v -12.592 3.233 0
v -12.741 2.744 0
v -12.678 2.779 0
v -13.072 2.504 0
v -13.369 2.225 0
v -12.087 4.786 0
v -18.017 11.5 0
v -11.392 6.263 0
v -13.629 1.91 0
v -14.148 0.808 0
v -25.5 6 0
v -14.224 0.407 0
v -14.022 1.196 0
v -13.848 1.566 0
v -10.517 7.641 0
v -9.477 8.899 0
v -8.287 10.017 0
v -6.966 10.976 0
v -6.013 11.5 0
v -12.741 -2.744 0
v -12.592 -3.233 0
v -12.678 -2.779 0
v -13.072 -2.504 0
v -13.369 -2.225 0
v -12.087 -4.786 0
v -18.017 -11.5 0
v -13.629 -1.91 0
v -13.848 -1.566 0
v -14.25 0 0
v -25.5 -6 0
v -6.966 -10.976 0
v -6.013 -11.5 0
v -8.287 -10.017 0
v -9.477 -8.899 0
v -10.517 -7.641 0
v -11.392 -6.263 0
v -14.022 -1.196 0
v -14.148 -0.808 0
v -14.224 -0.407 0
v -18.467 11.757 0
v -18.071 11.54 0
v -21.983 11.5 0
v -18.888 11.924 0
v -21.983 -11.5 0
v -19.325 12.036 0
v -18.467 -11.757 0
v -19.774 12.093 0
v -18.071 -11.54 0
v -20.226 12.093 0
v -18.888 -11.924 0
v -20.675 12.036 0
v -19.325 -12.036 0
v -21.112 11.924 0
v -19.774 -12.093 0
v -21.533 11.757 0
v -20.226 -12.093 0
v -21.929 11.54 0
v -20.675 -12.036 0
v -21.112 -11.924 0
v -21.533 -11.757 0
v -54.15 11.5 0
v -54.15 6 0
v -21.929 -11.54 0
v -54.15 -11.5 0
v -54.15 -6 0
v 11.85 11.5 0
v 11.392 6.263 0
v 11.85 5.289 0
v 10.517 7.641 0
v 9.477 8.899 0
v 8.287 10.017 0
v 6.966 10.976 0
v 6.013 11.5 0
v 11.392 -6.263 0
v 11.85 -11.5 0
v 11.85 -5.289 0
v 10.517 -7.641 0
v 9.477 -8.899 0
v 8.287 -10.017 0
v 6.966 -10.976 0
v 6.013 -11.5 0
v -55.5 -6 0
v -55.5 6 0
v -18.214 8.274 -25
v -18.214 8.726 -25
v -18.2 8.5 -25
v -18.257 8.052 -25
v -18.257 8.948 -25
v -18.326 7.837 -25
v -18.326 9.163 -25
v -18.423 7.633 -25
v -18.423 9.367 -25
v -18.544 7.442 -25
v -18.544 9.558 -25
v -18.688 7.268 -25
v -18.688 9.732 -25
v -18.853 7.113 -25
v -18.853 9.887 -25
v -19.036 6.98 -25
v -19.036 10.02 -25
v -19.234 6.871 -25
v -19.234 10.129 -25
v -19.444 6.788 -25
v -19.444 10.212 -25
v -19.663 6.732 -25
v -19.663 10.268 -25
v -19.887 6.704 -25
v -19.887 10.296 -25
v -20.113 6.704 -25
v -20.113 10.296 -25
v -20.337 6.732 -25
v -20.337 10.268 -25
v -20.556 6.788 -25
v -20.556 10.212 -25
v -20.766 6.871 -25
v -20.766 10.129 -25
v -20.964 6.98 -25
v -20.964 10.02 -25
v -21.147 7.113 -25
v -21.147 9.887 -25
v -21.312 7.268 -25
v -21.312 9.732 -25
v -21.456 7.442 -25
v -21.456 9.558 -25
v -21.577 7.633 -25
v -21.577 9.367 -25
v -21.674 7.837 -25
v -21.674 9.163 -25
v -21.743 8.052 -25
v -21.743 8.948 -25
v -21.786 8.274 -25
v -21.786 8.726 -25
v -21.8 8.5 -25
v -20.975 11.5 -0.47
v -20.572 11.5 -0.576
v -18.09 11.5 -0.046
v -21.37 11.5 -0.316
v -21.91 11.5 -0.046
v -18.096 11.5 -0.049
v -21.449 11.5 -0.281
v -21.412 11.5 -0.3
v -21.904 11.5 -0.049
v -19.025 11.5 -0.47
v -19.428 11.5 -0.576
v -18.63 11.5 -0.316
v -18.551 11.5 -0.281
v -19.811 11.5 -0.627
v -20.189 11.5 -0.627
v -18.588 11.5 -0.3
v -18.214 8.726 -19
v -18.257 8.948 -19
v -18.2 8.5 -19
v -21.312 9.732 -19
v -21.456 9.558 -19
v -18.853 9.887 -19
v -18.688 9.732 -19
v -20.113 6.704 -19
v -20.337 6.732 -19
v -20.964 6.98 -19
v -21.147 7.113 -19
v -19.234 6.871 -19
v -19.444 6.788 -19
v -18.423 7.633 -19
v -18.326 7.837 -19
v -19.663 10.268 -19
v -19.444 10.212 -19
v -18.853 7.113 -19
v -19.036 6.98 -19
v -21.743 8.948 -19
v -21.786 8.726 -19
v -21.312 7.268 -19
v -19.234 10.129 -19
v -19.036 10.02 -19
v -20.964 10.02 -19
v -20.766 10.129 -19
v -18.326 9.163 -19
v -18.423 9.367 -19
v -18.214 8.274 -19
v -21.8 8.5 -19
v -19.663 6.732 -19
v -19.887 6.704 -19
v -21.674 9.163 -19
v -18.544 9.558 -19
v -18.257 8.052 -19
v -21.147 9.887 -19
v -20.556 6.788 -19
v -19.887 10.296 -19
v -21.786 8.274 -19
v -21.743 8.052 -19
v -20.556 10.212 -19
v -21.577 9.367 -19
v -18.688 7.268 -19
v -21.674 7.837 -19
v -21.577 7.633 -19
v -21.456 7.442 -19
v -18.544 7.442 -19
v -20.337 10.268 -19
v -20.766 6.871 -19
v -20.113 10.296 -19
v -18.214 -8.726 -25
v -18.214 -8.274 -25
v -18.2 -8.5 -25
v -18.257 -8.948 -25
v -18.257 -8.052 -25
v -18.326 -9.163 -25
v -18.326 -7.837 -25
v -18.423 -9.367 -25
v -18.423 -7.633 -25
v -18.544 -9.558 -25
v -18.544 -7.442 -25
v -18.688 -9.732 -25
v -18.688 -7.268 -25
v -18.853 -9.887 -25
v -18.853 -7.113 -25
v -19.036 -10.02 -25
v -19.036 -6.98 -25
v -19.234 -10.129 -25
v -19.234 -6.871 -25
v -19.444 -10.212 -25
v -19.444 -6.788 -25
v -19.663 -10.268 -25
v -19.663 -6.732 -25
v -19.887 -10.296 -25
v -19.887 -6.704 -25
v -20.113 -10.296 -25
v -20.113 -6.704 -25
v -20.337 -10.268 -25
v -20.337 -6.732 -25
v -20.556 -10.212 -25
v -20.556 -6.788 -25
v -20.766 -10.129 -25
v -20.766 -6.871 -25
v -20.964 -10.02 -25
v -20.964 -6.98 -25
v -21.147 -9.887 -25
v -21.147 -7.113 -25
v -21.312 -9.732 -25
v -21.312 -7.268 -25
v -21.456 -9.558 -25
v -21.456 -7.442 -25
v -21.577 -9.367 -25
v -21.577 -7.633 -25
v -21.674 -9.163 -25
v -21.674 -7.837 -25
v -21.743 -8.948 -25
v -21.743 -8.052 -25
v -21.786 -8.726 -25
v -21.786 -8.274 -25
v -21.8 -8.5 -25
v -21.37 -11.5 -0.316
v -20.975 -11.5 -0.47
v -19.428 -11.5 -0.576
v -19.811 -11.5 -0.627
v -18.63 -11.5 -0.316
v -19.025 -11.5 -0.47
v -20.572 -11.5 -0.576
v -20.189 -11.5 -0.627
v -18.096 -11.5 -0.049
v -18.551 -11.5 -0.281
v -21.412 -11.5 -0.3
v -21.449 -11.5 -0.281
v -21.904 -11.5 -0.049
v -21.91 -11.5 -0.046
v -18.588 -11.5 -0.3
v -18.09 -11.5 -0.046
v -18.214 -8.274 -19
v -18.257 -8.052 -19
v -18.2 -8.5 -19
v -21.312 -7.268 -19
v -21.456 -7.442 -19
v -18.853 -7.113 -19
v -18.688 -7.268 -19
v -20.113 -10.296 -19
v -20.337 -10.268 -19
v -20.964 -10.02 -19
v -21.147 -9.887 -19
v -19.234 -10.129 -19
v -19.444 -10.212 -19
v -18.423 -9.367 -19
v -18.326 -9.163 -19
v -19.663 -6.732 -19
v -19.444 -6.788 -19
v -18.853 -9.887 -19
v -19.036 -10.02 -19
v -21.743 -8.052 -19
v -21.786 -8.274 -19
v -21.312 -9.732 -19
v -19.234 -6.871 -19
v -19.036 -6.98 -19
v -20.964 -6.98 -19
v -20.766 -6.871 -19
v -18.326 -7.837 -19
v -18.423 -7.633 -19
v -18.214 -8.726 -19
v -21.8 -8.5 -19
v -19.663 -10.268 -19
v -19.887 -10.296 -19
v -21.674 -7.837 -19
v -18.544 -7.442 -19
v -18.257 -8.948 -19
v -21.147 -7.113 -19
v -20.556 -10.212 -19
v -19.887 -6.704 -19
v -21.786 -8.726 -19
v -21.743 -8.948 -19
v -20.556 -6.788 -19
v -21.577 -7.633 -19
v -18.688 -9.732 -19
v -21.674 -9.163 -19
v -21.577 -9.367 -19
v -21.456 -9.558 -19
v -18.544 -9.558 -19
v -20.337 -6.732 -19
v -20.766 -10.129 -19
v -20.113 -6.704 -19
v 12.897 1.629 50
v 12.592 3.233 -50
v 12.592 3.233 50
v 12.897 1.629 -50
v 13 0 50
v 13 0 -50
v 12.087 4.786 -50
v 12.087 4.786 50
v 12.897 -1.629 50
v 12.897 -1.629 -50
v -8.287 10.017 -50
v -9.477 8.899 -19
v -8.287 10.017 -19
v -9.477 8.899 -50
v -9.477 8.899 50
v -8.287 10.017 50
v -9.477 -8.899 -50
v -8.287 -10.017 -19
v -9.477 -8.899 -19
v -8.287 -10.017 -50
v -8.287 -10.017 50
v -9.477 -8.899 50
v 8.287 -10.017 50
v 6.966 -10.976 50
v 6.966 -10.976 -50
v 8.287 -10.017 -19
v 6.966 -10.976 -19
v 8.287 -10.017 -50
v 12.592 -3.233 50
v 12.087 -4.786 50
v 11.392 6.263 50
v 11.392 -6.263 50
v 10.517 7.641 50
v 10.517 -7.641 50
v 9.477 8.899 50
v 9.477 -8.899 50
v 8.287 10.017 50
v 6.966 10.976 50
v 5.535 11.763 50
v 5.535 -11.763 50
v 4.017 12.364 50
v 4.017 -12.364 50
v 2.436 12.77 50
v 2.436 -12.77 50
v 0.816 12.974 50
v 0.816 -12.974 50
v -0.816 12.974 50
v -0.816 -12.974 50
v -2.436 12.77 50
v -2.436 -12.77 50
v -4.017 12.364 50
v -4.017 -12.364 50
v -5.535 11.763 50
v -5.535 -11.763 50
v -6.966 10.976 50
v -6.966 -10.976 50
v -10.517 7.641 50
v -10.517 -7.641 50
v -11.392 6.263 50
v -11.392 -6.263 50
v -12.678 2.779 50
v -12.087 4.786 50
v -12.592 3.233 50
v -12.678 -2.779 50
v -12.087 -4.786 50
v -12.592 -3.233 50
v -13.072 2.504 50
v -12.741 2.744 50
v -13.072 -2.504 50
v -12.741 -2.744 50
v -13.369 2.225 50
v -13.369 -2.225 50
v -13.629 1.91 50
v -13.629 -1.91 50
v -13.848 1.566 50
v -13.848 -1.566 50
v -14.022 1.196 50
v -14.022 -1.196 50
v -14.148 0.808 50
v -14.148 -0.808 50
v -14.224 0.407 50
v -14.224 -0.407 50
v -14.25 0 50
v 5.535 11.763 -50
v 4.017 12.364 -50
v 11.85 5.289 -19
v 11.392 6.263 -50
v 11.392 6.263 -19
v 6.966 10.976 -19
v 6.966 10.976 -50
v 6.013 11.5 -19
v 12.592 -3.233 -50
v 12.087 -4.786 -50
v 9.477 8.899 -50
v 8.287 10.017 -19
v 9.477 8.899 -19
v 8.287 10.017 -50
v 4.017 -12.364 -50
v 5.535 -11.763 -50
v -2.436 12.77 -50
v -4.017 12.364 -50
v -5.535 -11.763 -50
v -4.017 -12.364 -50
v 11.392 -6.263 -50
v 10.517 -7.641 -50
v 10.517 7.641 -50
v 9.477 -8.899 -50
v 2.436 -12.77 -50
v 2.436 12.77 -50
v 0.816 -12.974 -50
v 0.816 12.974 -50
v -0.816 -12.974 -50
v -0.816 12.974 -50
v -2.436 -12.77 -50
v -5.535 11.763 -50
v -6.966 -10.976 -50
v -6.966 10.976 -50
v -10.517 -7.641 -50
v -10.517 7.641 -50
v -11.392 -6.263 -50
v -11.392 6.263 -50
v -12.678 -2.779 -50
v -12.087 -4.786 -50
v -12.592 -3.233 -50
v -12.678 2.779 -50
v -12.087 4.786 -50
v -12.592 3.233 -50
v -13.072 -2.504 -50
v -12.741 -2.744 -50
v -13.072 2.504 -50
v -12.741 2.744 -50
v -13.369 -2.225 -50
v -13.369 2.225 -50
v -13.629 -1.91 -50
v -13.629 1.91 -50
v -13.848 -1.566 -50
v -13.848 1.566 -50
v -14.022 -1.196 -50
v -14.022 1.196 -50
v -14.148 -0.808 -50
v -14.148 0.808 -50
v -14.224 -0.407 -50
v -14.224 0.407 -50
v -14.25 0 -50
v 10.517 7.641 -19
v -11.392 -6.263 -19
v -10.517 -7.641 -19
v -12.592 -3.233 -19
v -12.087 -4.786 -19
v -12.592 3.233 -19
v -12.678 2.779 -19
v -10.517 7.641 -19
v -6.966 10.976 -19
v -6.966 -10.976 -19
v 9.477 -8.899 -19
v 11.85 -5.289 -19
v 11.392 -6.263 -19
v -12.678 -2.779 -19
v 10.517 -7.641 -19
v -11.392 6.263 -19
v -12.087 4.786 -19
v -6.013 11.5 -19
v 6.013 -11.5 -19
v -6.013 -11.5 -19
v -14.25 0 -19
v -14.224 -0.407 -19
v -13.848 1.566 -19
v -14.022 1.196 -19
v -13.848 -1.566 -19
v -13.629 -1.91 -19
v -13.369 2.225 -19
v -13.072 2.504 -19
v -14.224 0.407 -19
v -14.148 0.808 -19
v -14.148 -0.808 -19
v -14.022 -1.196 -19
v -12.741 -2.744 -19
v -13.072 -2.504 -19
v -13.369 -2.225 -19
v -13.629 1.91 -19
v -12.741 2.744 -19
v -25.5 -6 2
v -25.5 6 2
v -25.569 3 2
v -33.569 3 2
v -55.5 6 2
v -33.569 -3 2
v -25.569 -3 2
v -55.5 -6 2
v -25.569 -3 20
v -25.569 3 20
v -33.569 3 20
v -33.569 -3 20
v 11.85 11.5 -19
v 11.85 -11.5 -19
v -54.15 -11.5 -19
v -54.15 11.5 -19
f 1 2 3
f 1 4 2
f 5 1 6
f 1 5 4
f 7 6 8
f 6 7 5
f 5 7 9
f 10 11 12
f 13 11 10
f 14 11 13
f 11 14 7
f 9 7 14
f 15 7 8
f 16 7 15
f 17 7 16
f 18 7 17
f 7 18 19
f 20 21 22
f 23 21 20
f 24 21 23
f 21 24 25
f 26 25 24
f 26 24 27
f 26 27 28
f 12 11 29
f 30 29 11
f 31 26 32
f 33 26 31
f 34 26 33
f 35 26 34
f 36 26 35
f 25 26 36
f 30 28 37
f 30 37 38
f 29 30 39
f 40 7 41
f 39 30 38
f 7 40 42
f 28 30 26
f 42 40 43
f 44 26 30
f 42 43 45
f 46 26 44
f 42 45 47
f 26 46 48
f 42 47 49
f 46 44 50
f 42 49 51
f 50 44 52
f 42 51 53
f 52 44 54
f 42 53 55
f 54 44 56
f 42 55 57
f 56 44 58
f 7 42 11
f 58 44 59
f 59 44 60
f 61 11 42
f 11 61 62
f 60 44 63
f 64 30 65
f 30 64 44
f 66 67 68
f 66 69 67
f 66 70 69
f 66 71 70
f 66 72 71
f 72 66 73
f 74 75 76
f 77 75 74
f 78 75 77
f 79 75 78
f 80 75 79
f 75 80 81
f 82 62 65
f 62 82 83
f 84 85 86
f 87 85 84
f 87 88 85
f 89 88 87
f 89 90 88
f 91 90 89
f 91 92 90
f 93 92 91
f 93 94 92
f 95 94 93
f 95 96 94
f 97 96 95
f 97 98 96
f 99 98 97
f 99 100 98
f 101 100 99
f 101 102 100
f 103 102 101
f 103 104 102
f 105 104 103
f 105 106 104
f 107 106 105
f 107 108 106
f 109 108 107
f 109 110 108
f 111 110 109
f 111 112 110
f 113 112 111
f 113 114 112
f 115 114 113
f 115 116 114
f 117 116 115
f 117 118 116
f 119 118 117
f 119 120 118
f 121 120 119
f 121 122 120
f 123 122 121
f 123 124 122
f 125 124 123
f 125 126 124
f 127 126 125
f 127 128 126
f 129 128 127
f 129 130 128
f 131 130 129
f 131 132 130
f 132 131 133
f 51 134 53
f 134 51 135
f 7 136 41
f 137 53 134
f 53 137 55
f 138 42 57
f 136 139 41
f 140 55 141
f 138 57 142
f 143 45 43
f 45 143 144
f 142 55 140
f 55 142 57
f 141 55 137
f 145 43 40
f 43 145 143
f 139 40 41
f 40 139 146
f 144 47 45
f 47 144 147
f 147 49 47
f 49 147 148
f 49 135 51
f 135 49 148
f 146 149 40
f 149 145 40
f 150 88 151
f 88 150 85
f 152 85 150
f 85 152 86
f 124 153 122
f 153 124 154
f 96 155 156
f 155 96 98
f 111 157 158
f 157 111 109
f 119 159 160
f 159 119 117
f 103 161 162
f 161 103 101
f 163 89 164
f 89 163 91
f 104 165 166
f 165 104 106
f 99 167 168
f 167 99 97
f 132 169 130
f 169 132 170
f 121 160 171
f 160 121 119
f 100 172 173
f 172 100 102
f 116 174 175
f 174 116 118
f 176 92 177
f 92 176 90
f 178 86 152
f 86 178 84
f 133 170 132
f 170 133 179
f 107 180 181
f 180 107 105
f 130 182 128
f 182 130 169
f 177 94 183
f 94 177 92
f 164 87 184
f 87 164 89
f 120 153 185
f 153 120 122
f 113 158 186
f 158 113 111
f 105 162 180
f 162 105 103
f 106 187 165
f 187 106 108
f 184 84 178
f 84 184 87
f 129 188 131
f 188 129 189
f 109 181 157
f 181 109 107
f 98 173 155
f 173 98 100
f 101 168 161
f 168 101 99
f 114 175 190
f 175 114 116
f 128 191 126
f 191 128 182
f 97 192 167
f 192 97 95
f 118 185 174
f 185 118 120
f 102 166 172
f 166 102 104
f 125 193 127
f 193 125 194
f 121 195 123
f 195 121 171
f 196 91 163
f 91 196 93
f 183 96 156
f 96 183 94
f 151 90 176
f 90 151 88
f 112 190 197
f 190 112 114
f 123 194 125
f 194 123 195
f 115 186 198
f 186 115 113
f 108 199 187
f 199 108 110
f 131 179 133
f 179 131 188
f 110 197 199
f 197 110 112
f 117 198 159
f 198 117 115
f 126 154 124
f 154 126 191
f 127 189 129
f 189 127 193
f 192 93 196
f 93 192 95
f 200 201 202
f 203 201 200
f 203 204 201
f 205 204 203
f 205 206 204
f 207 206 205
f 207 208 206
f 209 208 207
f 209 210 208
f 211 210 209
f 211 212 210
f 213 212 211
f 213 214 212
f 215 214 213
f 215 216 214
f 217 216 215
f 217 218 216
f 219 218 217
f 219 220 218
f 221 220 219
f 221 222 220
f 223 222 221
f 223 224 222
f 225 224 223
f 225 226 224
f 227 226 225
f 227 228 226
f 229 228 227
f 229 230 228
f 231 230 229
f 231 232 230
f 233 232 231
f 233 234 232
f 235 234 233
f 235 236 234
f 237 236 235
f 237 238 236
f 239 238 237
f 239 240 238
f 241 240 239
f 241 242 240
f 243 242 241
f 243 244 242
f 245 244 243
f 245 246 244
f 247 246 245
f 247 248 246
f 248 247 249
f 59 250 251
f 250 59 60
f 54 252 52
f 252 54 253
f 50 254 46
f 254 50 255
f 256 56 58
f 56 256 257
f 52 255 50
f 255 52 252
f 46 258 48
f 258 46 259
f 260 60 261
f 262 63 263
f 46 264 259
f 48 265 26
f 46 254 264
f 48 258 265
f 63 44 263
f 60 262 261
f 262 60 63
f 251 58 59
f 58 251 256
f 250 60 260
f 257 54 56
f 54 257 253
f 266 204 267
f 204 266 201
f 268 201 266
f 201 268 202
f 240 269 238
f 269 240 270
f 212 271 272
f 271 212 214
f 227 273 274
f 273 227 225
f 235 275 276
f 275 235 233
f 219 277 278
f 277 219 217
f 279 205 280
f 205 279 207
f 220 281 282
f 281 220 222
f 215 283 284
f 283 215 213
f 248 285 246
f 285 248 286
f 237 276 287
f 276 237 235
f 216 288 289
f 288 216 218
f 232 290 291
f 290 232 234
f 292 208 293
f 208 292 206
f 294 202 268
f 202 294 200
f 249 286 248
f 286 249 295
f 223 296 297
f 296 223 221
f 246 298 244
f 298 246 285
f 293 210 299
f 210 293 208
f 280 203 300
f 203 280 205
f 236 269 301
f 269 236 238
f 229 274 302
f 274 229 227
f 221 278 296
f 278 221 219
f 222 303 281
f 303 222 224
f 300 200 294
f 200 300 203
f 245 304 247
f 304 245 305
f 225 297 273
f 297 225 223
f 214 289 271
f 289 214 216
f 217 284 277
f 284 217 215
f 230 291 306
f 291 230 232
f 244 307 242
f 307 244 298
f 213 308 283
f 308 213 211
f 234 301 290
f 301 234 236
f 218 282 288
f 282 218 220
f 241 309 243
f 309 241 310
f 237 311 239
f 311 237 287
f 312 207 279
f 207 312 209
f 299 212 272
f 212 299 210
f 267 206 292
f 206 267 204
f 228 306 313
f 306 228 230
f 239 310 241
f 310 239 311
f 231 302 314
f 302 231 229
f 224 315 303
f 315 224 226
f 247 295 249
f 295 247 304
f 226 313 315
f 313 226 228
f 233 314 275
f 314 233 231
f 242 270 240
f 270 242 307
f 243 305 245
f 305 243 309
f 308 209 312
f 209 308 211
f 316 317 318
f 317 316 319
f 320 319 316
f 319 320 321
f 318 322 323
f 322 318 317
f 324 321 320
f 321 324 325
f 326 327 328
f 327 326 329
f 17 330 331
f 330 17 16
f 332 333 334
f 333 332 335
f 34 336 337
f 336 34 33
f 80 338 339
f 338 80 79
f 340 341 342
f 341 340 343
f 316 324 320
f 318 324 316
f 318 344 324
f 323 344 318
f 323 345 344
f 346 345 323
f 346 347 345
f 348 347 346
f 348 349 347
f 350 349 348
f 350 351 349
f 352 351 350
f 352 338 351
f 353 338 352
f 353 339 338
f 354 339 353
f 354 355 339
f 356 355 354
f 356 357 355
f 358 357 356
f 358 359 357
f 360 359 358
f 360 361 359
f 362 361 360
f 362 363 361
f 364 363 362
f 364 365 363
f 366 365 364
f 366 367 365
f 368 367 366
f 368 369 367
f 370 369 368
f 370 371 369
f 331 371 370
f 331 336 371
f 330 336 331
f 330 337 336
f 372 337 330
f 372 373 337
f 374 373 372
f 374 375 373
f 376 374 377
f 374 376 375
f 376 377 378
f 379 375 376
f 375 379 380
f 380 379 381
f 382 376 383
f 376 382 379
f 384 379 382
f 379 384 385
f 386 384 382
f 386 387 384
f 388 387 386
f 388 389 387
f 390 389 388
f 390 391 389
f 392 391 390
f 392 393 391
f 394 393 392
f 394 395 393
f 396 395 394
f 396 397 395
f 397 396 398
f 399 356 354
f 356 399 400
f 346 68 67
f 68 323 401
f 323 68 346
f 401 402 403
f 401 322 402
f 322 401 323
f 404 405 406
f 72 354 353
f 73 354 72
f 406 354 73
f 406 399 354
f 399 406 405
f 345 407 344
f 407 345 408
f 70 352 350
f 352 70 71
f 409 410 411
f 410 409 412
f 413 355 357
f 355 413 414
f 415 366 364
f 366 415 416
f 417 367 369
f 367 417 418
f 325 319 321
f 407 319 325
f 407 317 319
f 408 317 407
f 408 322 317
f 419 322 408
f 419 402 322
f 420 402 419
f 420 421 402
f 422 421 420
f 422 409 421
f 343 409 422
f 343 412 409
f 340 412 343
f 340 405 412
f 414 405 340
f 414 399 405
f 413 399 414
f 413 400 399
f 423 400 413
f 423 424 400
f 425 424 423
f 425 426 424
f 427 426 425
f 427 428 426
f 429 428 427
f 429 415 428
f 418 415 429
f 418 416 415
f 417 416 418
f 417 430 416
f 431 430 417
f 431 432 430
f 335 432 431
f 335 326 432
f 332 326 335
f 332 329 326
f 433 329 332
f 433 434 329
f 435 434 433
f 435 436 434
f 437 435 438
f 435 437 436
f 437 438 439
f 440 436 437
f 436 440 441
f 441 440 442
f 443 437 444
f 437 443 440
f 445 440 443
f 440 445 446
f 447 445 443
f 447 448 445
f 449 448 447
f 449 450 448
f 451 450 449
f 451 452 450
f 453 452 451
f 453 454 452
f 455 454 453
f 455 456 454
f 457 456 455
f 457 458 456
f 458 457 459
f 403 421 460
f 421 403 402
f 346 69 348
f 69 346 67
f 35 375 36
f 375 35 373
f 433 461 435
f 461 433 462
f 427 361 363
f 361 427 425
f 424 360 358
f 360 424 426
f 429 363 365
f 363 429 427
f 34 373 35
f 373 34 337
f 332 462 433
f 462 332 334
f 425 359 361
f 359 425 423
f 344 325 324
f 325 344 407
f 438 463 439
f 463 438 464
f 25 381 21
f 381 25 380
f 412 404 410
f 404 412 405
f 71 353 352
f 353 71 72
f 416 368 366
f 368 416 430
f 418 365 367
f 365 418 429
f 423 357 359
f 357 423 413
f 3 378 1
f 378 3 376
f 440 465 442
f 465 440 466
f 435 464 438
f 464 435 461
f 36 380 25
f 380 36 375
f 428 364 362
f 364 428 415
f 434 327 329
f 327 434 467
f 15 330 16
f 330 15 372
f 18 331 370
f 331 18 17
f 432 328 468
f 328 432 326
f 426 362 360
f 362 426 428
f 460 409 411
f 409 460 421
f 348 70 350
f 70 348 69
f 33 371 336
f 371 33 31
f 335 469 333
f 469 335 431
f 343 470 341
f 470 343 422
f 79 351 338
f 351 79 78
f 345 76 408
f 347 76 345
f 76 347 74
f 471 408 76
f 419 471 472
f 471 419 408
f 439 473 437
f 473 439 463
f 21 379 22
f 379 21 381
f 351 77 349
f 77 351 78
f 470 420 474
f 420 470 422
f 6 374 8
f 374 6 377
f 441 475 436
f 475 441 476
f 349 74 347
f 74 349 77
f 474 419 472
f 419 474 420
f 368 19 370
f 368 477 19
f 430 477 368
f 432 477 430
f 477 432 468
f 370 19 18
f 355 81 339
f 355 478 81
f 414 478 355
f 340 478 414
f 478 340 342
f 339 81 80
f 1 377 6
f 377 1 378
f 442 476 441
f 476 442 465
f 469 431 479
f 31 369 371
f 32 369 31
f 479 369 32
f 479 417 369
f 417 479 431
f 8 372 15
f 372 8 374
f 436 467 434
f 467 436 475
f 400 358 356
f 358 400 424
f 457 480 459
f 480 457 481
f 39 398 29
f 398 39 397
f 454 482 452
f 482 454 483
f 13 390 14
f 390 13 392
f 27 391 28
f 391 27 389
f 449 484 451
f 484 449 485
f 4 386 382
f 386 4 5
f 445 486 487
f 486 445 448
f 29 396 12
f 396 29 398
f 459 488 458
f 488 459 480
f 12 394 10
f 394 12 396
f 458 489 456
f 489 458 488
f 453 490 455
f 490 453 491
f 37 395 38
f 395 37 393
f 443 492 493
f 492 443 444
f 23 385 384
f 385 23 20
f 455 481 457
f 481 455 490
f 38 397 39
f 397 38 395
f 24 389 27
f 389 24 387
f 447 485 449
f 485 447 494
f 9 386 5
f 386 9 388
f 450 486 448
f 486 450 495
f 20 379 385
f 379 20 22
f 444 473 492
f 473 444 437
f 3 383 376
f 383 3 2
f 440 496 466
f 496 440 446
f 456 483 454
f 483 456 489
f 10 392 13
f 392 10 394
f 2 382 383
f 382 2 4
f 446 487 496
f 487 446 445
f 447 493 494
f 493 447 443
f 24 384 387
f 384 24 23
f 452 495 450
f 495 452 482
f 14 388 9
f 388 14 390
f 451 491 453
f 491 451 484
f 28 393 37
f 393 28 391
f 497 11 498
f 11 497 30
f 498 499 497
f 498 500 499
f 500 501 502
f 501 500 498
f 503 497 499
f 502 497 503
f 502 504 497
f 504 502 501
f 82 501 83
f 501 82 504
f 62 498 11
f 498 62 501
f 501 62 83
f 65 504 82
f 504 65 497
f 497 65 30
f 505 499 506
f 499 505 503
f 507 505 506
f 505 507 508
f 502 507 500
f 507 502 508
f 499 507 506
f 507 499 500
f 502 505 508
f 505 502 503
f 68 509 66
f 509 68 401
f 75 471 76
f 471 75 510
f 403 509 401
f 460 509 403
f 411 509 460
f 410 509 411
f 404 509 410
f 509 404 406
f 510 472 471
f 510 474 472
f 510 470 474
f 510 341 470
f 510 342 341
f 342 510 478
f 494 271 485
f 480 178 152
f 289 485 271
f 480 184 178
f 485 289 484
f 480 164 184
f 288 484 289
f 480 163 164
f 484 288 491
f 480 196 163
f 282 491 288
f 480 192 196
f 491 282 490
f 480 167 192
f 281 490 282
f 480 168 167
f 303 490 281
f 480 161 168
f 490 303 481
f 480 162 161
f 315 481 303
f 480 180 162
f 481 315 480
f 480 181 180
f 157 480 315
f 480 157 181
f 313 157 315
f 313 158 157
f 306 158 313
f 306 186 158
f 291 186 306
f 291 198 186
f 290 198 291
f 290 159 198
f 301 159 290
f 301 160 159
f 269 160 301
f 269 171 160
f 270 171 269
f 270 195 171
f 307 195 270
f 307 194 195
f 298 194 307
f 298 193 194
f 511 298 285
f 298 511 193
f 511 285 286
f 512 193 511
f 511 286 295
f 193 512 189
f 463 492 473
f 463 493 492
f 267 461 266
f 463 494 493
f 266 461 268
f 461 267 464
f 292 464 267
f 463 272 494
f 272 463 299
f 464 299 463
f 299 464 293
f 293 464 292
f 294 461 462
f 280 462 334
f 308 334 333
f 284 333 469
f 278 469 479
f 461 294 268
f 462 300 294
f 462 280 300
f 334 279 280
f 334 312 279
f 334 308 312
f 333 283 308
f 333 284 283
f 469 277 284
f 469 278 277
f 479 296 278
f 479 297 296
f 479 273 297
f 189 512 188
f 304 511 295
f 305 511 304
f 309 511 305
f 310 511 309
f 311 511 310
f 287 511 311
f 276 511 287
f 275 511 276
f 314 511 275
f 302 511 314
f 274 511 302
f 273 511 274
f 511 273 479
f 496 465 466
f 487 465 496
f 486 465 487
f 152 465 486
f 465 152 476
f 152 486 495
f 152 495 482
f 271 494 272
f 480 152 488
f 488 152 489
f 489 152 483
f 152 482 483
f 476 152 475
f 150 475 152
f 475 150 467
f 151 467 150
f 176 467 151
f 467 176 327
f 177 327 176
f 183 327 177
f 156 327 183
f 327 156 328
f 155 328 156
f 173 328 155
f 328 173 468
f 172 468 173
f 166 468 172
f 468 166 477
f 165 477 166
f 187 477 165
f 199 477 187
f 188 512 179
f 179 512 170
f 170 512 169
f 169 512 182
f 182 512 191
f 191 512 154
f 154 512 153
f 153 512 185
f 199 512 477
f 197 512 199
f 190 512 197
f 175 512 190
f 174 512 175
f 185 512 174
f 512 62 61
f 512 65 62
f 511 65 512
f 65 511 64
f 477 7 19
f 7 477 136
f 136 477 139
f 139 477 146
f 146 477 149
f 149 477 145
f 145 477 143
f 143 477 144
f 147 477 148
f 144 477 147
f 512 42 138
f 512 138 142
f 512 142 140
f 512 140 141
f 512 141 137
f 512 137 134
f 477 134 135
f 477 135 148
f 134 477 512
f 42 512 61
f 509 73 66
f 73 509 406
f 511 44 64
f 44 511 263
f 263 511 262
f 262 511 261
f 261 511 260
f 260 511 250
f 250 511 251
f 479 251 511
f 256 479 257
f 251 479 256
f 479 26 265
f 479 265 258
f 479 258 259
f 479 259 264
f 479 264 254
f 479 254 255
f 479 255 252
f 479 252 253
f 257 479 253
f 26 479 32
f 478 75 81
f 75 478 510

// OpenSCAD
$fn = 50;


difference() {
	union() {
		translate(v = [-20, 8.5000000000, 0]) {
			rotate(a = [0, 0, 0]) {
				difference() {
					union() {
						translate(v = [0, 0, -25.0000000000]) {
							cylinder(h = 25, r = 1.5000000000);
						}
						translate(v = [0, 0, -1.9000000000]) {
							cylinder(h = 1.9000000000, r1 = 1.8000000000, r2 = 3.6000000000);
						}
						translate(v = [0, 0, -25.0000000000]) {
							cylinder(h = 25, r = 1.8000000000);
						}
						translate(v = [0, 0, -25.0000000000]) {
							cylinder(h = 25, r = 1.5000000000);
						}
					}
					union();
				}
			}
		}
		translate(v = [-20, -8.5000000000, 0]) {
			rotate(a = [0, 0, 0]) {
				difference() {
					union() {
						translate(v = [0, 0, -25.0000000000]) {
							cylinder(h = 25, r = 1.5000000000);
						}
						translate(v = [0, 0, -1.9000000000]) {
							cylinder(h = 1.9000000000, r1 = 1.8000000000, r2 = 3.6000000000);
						}
						translate(v = [0, 0, -25.0000000000]) {
							cylinder(h = 25, r = 1.8000000000);
						}
						translate(v = [0, 0, -25.0000000000]) {
							cylinder(h = 25, r = 1.5000000000);
						}
					}
					union();
				}
			}
		}
		translate(v = [0, 0, -50.0000000000]) {
			cylinder(h = 100, r = 13.0000000000);
		}
		translate(v = [-11, 0, -50.0000000000]) {
			cylinder(h = 100, r = 3.2500000000);
		}
		translate(v = [-55.5000000000, -6.0000000000, 0]) {
			cube(size = [30, 12, 2]);
		}
		translate(v = [-54.0000000000, -4.0000000000, 0]) {
			cube(size = [18, 8, 2]);
		}
		translate(v = [-33.5690000000, -3.0000000000, 0]) {
			cube(size = [8, 6, 20]);
		}
		translate(v = [-54.1500000000, -11.5000000000, -19]) {
			cube(size = [66, 23, 19]);
		}
	}
	union();
}
